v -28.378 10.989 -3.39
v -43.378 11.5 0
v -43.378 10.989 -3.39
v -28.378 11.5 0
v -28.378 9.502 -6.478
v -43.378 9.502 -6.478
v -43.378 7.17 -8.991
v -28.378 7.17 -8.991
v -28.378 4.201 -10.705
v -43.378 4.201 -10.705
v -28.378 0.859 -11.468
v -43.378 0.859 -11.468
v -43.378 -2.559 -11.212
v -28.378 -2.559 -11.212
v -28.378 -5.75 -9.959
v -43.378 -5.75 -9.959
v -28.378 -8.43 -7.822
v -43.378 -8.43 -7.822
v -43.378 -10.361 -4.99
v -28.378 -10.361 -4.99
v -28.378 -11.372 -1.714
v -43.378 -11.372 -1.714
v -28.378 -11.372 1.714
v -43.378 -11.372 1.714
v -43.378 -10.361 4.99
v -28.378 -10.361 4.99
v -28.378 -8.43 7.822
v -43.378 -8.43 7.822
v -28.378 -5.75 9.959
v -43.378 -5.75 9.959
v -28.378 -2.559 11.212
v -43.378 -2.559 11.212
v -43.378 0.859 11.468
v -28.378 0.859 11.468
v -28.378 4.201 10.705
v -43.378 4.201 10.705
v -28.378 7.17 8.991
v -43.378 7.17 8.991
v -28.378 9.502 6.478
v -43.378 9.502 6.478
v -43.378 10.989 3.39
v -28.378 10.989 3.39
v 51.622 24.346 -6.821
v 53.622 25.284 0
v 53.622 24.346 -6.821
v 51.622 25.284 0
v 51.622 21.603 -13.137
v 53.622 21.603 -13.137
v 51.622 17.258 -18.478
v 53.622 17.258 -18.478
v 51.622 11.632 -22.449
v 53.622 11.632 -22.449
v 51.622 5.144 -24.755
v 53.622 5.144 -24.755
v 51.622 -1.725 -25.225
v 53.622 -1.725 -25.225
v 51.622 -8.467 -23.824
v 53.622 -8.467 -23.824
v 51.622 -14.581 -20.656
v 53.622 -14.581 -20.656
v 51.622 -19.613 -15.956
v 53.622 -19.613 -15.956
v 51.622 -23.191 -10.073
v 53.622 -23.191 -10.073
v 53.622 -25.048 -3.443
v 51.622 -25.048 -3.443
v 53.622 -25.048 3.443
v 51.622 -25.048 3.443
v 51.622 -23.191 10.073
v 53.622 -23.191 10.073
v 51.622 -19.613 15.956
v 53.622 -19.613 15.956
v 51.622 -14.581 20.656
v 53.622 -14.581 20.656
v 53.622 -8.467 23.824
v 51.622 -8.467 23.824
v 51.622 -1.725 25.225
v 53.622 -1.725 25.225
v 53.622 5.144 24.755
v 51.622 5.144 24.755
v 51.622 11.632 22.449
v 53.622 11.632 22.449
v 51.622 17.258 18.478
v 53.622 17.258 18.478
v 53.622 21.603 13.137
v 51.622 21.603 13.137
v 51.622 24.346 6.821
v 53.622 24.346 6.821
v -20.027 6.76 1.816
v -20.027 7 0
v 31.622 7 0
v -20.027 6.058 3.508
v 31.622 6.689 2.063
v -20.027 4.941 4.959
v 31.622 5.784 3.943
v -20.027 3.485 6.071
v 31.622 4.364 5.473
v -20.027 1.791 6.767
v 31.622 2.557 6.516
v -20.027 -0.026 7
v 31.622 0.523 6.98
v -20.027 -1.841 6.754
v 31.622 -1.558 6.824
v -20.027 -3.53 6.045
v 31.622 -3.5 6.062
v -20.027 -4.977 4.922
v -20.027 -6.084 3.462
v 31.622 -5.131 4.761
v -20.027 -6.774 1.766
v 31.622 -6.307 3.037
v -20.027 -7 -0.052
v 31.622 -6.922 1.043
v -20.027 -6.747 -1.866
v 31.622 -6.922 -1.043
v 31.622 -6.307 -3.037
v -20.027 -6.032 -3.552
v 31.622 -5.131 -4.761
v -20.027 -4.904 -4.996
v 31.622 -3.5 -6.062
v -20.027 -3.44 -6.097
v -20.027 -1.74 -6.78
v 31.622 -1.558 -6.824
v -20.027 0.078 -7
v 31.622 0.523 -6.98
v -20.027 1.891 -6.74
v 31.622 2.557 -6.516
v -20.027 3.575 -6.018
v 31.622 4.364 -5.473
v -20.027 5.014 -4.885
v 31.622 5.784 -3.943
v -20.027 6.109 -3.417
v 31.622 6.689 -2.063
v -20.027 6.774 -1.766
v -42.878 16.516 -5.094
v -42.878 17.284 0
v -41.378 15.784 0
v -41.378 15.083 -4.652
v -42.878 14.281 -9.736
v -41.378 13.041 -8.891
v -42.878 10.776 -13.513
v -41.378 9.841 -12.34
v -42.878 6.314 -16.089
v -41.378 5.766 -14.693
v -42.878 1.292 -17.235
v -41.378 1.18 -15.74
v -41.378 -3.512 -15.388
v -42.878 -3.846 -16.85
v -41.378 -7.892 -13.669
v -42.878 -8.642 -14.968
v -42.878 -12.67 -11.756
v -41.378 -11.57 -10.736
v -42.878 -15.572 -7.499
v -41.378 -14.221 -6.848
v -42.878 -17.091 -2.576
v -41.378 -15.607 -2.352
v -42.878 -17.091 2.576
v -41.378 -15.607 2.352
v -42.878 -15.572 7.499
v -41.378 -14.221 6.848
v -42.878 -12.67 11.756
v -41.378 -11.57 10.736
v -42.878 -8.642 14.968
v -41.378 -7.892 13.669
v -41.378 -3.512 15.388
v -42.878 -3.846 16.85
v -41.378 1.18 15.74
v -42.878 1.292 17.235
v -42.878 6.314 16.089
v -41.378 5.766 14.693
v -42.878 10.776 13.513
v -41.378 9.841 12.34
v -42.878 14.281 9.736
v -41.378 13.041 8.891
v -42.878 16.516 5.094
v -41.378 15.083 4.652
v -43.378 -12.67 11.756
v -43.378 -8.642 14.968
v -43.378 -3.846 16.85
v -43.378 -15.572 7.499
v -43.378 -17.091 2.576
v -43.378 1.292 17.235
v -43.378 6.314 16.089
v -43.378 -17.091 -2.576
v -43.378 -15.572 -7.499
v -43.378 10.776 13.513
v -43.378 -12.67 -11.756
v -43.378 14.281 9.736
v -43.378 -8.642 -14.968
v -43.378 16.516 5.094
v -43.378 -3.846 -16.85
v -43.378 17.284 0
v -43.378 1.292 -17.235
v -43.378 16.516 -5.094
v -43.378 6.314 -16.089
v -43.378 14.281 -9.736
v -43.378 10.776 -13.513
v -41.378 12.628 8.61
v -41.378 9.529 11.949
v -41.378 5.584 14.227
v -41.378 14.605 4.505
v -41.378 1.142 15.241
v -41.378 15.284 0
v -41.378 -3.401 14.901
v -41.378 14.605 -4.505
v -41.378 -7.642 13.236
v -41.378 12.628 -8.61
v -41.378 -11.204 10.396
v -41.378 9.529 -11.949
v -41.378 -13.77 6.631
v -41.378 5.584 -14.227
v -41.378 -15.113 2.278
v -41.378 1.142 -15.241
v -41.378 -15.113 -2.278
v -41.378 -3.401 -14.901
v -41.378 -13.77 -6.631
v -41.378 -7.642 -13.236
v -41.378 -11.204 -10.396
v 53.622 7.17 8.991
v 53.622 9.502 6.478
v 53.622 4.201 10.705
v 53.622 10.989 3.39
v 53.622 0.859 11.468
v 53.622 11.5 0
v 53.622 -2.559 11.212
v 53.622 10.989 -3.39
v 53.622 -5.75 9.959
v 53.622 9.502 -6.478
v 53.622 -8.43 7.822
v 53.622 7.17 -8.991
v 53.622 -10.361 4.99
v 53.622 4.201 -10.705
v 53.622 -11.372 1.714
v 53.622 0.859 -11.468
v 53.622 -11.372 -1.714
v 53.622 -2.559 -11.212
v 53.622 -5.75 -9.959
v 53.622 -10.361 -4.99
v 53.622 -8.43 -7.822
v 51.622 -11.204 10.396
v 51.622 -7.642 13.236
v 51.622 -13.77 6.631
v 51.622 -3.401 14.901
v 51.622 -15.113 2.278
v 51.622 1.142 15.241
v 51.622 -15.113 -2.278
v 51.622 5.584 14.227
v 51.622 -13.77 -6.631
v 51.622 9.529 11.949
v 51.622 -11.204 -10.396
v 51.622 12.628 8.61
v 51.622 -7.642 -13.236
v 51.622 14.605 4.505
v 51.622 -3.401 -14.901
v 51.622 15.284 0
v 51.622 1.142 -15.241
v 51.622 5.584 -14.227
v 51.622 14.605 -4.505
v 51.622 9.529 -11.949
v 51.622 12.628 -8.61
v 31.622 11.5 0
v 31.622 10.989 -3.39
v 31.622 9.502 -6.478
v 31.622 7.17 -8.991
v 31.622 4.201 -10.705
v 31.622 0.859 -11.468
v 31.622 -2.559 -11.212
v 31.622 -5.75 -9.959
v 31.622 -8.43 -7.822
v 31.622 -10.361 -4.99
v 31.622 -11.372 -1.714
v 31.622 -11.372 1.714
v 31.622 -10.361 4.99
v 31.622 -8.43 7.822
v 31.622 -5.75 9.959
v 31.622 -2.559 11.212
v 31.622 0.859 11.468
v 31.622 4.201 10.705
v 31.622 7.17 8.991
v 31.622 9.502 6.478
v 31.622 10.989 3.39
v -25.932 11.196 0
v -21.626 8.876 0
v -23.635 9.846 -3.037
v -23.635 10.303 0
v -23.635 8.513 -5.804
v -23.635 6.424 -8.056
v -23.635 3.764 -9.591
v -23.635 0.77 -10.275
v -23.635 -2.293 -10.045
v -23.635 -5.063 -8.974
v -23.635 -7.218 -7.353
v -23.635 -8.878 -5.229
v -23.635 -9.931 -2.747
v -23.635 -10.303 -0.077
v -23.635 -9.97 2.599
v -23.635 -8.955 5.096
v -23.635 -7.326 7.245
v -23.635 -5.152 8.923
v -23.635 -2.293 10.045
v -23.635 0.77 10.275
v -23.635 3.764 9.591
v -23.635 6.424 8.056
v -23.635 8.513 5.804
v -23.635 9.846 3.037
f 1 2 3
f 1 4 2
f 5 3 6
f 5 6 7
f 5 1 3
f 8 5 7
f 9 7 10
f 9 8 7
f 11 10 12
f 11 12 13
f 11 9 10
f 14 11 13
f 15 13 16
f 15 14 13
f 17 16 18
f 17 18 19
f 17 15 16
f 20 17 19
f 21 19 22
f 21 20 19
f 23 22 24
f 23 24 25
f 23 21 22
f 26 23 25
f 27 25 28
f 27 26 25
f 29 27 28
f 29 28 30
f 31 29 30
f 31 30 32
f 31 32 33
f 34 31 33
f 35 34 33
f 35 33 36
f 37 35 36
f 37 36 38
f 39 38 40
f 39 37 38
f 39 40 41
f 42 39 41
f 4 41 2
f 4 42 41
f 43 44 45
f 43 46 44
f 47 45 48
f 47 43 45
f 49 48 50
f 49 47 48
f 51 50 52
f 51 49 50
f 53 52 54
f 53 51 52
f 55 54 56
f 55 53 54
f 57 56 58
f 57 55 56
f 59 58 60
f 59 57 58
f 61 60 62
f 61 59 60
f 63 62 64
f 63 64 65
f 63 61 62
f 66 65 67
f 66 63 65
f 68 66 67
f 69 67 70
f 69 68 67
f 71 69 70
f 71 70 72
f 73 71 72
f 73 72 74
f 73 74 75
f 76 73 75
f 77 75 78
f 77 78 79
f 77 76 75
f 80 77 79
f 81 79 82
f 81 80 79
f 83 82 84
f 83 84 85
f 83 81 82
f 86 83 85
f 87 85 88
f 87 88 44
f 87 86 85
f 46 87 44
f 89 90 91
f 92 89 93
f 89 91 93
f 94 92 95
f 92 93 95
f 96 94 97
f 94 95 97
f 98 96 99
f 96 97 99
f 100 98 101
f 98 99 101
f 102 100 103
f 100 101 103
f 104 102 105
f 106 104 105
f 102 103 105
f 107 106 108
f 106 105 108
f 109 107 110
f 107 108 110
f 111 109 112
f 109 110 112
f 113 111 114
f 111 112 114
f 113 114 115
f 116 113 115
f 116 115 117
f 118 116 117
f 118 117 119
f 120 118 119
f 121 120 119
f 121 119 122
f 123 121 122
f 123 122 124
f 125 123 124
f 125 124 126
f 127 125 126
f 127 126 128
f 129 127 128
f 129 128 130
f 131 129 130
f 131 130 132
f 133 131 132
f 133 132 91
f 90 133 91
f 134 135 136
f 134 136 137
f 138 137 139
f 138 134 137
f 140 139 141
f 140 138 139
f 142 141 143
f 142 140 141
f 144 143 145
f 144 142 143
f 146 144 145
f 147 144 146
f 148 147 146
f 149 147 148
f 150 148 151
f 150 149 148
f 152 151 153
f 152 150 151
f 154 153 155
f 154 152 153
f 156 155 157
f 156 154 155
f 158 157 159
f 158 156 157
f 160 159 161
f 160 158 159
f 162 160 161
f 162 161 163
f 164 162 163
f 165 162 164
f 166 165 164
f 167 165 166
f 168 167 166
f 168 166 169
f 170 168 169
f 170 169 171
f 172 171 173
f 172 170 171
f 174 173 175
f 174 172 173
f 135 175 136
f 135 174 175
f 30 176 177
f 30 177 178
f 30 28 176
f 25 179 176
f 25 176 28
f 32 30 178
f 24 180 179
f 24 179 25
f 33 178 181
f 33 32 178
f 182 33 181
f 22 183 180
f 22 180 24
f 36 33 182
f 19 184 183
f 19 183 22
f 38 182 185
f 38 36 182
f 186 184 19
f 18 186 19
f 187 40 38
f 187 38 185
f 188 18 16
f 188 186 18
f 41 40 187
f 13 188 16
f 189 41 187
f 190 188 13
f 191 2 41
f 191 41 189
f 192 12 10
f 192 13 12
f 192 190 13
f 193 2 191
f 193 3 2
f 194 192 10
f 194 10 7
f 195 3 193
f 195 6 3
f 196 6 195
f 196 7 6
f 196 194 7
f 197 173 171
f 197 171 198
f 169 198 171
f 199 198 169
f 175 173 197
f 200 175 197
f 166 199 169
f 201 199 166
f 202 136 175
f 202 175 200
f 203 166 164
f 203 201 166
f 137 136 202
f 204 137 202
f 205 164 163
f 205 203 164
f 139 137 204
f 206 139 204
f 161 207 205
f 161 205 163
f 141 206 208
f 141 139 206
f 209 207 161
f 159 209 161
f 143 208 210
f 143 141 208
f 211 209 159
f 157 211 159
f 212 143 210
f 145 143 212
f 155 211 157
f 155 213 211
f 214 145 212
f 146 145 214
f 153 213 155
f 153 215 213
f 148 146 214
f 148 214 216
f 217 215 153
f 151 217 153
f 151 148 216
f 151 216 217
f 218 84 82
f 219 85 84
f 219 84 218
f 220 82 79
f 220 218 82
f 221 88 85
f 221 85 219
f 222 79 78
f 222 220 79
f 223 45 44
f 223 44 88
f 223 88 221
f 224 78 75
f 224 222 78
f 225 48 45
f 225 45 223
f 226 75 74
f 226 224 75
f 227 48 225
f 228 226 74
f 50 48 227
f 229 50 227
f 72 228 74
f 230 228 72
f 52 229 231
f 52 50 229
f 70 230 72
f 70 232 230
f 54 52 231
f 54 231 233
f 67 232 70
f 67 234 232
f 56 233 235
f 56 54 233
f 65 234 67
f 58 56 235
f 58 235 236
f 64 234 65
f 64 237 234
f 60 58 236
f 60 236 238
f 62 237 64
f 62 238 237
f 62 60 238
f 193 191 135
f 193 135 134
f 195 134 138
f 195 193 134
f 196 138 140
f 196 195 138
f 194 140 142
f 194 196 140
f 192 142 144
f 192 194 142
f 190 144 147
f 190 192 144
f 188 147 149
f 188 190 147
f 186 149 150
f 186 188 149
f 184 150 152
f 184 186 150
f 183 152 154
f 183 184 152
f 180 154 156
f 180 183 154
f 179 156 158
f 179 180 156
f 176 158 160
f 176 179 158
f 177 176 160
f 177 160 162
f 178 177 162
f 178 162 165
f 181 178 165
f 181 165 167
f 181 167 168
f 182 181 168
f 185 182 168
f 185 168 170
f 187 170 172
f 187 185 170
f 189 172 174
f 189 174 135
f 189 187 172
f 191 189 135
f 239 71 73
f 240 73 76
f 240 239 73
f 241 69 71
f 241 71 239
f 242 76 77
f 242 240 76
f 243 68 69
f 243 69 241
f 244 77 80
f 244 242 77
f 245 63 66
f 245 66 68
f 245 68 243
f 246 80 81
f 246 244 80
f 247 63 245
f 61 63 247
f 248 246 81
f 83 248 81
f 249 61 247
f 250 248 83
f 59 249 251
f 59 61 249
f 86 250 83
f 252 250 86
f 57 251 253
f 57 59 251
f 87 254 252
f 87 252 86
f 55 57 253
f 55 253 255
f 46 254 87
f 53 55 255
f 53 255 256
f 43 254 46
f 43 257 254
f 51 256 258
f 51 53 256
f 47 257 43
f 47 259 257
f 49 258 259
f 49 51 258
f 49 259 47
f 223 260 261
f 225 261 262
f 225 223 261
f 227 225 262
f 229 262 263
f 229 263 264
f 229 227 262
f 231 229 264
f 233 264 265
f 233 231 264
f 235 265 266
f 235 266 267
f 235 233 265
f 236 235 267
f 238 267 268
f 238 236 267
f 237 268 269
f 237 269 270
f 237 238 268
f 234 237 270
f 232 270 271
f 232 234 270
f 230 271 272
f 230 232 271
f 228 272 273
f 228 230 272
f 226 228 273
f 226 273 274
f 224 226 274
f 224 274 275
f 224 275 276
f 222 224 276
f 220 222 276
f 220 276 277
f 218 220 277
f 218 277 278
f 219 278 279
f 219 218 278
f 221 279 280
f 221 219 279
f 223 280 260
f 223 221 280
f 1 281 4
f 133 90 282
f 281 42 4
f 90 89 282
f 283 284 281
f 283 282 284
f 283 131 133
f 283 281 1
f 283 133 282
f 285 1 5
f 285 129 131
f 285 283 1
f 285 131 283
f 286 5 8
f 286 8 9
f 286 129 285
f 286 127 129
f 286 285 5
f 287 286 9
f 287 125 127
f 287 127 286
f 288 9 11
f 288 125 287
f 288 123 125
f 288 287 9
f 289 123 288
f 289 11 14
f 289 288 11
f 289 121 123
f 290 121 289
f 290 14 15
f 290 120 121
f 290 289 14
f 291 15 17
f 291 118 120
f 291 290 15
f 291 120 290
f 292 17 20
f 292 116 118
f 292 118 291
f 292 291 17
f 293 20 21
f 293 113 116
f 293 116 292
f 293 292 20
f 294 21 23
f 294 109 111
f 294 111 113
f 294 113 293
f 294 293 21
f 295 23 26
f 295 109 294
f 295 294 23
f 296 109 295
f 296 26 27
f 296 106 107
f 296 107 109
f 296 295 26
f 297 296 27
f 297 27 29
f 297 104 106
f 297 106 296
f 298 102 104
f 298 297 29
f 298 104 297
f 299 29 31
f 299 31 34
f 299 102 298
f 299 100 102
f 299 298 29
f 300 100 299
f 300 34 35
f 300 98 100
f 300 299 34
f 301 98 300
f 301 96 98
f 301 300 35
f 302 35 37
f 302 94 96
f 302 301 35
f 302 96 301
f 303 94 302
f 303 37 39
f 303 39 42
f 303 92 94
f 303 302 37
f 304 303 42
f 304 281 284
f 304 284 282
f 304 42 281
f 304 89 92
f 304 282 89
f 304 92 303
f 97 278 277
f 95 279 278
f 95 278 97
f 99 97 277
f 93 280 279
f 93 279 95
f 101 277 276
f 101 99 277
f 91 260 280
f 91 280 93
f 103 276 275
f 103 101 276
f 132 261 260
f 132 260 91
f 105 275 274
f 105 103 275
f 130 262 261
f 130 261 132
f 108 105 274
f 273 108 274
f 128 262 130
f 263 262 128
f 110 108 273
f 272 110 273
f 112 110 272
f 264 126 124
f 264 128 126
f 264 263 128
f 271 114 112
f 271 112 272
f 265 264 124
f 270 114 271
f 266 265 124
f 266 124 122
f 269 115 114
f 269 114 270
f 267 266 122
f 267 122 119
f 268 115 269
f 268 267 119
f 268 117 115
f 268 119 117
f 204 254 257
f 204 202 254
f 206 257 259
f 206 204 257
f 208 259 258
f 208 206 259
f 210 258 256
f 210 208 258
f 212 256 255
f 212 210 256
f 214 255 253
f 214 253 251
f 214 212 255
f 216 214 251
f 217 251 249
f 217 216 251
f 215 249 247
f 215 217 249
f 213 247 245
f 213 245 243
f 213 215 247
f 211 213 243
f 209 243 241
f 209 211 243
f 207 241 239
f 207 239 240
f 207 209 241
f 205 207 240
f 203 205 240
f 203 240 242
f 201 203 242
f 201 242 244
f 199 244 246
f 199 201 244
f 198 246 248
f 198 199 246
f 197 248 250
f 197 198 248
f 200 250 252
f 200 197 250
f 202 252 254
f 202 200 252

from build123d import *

# Parameters (mm, degrees)
F2_SIZE  = 1.5
F3_R     = 7
F4_DEPTH = 75.001


# Not quite as in the source:
# - a feature names something its author has since deleted; it is built from what else it names


with BuildPart() as f1:
    # F0 (on Top) → F1 (revolve)
    with BuildSketch(Plane.XY):
        with BuildLine():
            Line((-18.3783795104, 0), (31.6216204896, 0))
            Line((31.6216204896, 0), (31.6216204896, 11.5))
            Line((31.6216204896, 11.5), (53.6216204896, 11.5))
            Line((53.6216204896, 11.5), (53.6216204896, 15.2837846328))
            Line((53.6216204896, 15.2837846328), (53.6216204896, 25.2837846328))
            Line((53.6216204896, 25.2837846328), (51.6216204896, 25.2837846328))
            Line((51.6216204896, 25.2837846328), (51.6216204896, 15.2837846328))
            Line((51.6216204896, 15.2837846328), (39.6216204896, 15.2837846328))
            Line((39.6216204896, 15.2837846328), (-41.3783795104, 15.2837846328))
            Line((-41.3783795104, 15.2837846328), (-41.3783795104, 17.2837846328))
            Line((-41.3783795104, 17.2837846328), (-43.3783795104, 17.2837846328))
            Line((-43.3783795104, 17.2837846328), (-43.3783795104, 15.2837846328))
            Line((-43.3783795104, 15.2837846328), (-43.3783795104, 11.5))
            Line((-43.3783795104, 11.5), (-28.3783795104, 11.5))
            ThreePointArc((-28.3783795104, 11.5), (-21.3073116985, 8.5710678119), (-18.3783795104, 1.5))
            Line((-18.3783795104, 1.5), (-18.3783795104, 0))
        make_face()
    revolve(axis=Axis((6.6216204896, 0, 0), (-1, 0, 0)))

    # F2
    f2_edges = [f1.edges().sort_by_distance(p)[0] for p in [
        (-41.37838, -17.283785, 0),
    ]]
    chamfer(f2_edges, length=F2_SIZE)

    # F3 (on face) → F4 (cut, through all)
    with BuildSketch(Plane.YZ.offset(31.6216204896)):
        Circle(F3_R)
    extrude(amount=-F4_DEPTH, mode=Mode.SUBTRACT)


solid = f1.part
